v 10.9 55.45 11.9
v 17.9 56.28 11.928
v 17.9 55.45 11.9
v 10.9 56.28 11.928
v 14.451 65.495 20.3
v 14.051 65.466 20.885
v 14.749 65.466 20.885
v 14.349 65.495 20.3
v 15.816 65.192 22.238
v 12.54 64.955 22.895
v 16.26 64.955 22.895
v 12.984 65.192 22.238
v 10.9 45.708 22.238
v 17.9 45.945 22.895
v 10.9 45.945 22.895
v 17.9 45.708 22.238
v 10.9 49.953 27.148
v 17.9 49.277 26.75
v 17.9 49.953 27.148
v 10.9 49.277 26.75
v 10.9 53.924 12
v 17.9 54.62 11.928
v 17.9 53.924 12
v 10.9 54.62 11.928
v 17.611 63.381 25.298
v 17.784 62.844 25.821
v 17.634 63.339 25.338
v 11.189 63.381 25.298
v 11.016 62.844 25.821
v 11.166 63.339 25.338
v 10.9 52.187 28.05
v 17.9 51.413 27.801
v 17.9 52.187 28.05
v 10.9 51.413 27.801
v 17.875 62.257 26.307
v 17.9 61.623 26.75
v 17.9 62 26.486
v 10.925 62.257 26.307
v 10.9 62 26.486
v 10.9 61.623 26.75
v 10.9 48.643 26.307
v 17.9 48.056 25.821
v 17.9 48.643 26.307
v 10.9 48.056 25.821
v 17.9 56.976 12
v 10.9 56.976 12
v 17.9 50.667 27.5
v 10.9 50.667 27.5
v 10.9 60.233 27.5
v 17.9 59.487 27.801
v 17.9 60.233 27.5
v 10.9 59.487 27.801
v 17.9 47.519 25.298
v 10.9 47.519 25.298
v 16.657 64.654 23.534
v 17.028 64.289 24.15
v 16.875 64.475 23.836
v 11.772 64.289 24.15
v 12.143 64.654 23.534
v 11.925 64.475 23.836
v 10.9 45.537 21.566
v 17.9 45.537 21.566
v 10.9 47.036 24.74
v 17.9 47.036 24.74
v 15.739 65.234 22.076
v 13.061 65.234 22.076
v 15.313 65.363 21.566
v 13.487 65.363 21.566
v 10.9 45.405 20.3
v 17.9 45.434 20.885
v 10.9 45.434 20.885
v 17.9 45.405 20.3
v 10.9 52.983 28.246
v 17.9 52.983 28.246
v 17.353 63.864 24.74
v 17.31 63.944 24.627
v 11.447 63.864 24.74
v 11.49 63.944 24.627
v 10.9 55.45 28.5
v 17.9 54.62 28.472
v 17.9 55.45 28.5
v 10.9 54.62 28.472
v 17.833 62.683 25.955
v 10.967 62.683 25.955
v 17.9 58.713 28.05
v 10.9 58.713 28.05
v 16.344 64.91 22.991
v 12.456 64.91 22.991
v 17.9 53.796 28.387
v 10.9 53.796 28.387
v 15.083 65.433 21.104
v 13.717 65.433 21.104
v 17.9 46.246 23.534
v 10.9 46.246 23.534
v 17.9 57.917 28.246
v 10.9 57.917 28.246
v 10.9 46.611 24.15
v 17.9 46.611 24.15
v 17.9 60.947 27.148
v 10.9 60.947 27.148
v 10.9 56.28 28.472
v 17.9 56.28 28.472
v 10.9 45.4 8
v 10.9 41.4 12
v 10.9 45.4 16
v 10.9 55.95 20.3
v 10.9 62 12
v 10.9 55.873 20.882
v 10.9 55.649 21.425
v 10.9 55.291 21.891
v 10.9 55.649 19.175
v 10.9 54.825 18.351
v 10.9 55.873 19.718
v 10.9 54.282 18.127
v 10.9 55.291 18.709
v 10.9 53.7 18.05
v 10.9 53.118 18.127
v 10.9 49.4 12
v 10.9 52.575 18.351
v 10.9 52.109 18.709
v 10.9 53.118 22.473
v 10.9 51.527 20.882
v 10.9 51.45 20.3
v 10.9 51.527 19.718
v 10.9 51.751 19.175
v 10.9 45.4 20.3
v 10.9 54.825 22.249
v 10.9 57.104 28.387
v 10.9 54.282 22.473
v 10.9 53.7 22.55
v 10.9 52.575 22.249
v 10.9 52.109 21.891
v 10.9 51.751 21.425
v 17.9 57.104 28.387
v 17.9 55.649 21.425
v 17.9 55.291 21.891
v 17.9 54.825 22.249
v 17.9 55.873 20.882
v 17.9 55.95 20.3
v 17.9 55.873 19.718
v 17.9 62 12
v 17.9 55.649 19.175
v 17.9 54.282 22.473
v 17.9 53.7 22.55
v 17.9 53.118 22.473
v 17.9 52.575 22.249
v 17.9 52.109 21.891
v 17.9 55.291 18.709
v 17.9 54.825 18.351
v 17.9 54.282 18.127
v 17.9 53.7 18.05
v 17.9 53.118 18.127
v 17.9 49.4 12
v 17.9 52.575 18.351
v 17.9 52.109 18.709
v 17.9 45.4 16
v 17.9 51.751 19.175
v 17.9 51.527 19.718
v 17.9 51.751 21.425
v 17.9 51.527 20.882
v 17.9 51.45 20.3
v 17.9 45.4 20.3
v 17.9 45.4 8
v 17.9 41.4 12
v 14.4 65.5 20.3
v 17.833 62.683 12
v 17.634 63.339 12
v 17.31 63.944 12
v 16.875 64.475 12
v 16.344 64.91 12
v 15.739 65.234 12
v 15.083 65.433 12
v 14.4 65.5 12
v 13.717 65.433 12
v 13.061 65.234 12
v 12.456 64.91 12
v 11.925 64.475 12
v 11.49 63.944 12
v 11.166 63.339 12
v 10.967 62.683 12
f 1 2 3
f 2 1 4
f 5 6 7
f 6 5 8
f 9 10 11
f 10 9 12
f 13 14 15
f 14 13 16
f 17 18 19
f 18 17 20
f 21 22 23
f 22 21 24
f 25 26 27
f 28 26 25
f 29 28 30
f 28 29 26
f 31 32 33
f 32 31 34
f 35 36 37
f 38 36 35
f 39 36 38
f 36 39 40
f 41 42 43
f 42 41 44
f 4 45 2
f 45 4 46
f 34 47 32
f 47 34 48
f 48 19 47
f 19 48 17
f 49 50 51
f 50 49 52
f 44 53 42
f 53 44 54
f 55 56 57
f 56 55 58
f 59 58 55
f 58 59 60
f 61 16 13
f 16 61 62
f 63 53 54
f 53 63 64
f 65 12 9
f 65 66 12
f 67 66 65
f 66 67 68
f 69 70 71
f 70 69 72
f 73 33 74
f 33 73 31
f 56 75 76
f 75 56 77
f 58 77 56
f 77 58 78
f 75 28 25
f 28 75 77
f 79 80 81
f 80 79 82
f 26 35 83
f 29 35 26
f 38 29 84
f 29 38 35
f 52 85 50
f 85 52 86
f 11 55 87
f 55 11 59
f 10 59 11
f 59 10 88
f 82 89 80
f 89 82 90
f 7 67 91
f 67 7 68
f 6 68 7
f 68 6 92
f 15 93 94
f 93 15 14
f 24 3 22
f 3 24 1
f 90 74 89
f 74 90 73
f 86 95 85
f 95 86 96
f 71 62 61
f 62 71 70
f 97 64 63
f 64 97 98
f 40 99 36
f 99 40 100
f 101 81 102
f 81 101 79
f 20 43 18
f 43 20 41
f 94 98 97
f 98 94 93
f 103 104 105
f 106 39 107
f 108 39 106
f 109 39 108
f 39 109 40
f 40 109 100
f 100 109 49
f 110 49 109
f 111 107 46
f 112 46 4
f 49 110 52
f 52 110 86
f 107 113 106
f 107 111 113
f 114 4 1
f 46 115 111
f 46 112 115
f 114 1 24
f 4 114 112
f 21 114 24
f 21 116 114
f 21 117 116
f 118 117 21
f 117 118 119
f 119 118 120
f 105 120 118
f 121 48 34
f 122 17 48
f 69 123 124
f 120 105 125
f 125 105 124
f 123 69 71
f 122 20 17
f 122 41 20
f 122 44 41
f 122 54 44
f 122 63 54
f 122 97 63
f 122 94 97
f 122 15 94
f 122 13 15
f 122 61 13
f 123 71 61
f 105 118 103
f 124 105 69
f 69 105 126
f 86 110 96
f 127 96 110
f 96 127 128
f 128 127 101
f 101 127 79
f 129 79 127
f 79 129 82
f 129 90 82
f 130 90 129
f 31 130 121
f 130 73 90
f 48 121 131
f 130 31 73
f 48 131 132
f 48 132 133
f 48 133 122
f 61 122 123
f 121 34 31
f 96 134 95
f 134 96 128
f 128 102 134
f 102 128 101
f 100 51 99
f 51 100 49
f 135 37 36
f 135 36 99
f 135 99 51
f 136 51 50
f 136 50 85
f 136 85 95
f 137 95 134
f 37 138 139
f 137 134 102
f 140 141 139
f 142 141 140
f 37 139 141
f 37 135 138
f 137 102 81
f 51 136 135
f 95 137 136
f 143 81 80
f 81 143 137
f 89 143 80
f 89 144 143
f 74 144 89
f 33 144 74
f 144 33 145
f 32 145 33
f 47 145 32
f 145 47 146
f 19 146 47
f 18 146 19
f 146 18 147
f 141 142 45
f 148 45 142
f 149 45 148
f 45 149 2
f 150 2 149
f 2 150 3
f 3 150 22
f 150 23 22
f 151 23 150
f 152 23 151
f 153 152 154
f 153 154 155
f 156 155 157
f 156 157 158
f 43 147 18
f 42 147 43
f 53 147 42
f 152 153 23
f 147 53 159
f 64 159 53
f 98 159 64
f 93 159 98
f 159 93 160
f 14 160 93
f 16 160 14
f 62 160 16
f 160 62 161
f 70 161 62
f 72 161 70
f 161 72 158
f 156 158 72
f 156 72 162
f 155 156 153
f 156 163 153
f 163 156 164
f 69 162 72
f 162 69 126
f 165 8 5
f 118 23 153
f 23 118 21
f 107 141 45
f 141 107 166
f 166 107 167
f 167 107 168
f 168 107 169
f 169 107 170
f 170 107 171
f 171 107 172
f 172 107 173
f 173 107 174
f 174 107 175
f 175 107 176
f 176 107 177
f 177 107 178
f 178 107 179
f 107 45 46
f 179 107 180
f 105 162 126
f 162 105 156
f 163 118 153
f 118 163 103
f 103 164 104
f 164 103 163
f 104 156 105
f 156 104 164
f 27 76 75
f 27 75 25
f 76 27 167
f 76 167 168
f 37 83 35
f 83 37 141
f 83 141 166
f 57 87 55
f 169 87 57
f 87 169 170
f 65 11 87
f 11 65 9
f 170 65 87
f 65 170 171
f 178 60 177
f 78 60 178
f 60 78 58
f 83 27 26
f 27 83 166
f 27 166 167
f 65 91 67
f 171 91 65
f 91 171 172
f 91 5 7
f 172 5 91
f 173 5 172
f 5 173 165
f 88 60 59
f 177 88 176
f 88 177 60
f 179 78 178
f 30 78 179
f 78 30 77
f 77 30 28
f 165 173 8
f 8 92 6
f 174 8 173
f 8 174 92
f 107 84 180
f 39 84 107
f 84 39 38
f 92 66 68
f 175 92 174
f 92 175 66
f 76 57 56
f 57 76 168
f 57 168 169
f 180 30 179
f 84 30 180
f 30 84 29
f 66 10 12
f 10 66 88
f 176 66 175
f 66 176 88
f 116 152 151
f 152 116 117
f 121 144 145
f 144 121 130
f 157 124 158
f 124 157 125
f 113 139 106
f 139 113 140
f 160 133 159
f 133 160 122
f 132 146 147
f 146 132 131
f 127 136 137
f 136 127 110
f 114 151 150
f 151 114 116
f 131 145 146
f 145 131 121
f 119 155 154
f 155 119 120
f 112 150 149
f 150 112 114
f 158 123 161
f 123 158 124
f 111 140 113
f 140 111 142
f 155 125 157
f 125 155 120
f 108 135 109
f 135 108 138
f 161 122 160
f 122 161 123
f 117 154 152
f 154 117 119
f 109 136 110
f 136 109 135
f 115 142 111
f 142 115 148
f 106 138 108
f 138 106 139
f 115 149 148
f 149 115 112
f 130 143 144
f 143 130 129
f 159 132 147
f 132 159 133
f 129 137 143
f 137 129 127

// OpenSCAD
//Delta Emmett P/S Mounting Bracket
//Bracket for mounting P/S on 2 - 1/2" EMT, 2 - 3/4" EMT or 2 - 1/2" PVC Horizontals
//12/9/2015     By: David Bunch
//10/23/2016    Modified for use with an P/S holding bracket
//11/3/2016     Combined 1/2"EMT, 3/4"EMT & 1/2"PVC into 1 file & added extension for short build O.D.

Ht = 12;
ET = 2;                 //0 = 1/2", 1 = 3/4", 2 = 1/2" PVC
HoleID = 3.5;           //Probably need M3x16mm screws for Bracket mount to 3/4" EMT
                        //and M3x30mm screws for 1/2" EMT or 1/2" PVC
PS_Hole_OD = 4.5;       //Diameter of Hole for P/S
BoltHdDia = 7.8;        //Diameer of M3 Bolt Head
M3Nut = 7;              //Diameter of M3 Nut to use

Extend_PS_Hole = 1;     //1 = Extend Hole, 0 = Not
//
//Setup arrays to choose between 1/2"EMT, 3/4"EMT or 1/2"PVC based on ET variable
A_Pipe_Type = [12,34,12];
A_Pipe_OD = [18.4,23.7,21.8];
A_Hole_Y_Offset = [12.5,20,14.2];
A_PS_Hole_Y_Offset = [58.8,41.15,53.7];
A_M3Head_X_Offset = [9.7,5,10.48];
A_M3Nut_X_Offset = [-9.7,-4.97,-10.48];
A_Weld_Offset = [50.5,32.85,45.4];
A_PS_Ext_X_Offset = [9.2,11.9,10.9];
A_Z_Ext_Hole = [0,14.3];        //This array based on Extend_PS_Hole Index
A_CutEnd_Y_Offset = [67.1,49.45,62];
Ht2 = Ht / 2;

Pipe_Type = A_Pipe_Type[ET];
Pipe_OD = A_Pipe_OD[ET];
Hole_Y_Offset = A_Hole_Y_Offset[ET];
Pipe_Y_Offset = Hole_Y_Offset * 2;
PS_Hole_Y_Offset = A_PS_Hole_Y_Offset[ET];
M3Head_X_Offset = A_M3Head_X_Offset[ET];
M3Nut_X_Offset = A_M3Nut_X_Offset[ET];
Weld_Offset = A_Weld_Offset[ET];
PS_Ext_X_Offset = A_PS_Ext_X_Offset[ET];
//Ext_Y_Offset = A_Ext_Y_Offset[ET];
echo(PS_Ext_X_Offset = PS_Ext_X_Offset);
Z_Ext_Hole = A_Z_Ext_Hole[Extend_PS_Hole];
echo(Z_Ext_Hole = Z_Ext_Hole);
CutEnd_Y_Offset = A_CutEnd_Y_Offset[ET];

Hole_Res = 24;
Pipe_Res = (round(((Pipe_OD * 3.14)/4)/.7)*4);      //Resolution for Chamfer Pipe Cuts
echo(Pipe_Res = Pipe_Res);
$fn=76;
module PS_Bracket()
{
    if (ET < 2)
    {
        if (Extend_PS_Hole == 0)
        {
            linear_extrude(height = Ht, center = false, convexity = 10)
            import("Pipes_PS_Brackets.dxf", layer = str("EMT",Pipe_Type,"_PS_Bracket_Outline"));
        } else
        {
            union()
            {
                linear_extrude(height = Ht, center = false, convexity = 10)
                import("Pipes_PS_Brackets.dxf", layer = str("EMT",Pipe_Type,"_PS_Bracket_Outline"));
                ExtendConnect();
                translate([PS_Ext_X_Offset,Weld_Offset,Ht])
                rotate([0,90,0])
                cylinder(d=8,h=7,$fn=4);
            }
        }
    } else
    {
        if (Extend_PS_Hole == 0)
        {
            linear_extrude(height = Ht, center = false, convexity = 10)
            import("Pipes_PS_Brackets.dxf", layer = str("PVC",Pipe_Type,"_PS_Bracket_Outline"));
        } else
        {
            union()
            {
                linear_extrude(height = Ht, center = false, convexity = 10)
                import("Pipes_PS_Brackets.dxf", layer = str("PVC",Pipe_Type,"_PS_Bracket_Outline"));
                ExtendConnect();
                translate([PS_Ext_X_Offset,Weld_Offset,Ht])
                rotate([0,90,0])
                cylinder(d=8,h=7,$fn=4);
            }
        }        
    }
}
module PS_Bracket_Cut()
{
    if (ET < 2)
    {
    translate([0,0,-1])
        linear_extrude(height = Ht+ 2, center = false, convexity = 10)
        import("Pipes_PS_Brackets.dxf", layer = str("EMT",Pipe_Type,"_PS_Bracket_Cutout"));
    } else
    {
    translate([0,0,-1])
        linear_extrude(height = Ht + 2, center = false, convexity = 10)
        import("Pipes_PS_Brackets.dxf", layer = str("PVC",Pipe_Type,"_PS_Bracket_Cutout"));
    }
}
module CutNutTrap()
{
    rotate([0,90,0])
    rotate([90,0,0])
    {
        translate([0,0,-2.25])
        cylinder(d=7,h=4.5,$fn=6);
        translate([-20,-3.0311,-2.25])
        cube([20,6.0622,4.5]);
    }
}
module TaperPipe_Hole()
{
    translate([0,0,Ht-1])
    cylinder(d1 = Pipe_OD, d2 = Pipe_OD+2, h = 1.01, $fn = Pipe_Res);
    translate([0,-Pipe_Y_Offset,Ht-1])
    cylinder(d1=Pipe_OD,d2=Pipe_OD+2,h=1.01, $fn = Pipe_Res);

    translate([0,0,-.01])
    cylinder(d1 = Pipe_OD + 2, d2 = Pipe_OD, h = 1.01, $fn = Pipe_Res);
    translate([0,-Pipe_Y_Offset,-.01])
    cylinder(d1 = Pipe_OD + 2, d2 = Pipe_OD, h = 1.01, $fn = Pipe_Res);
}
module ExtendConnect()
{
    echo(PS_Hole_Y_Offset = PS_Hole_Y_Offset);
//    hull()
//    {
        translate([PS_Ext_X_Offset,PS_Hole_Y_Offset+1.75,Ht2+14.2])
        rotate([0,90,0])
        scale([1,20.1/16.6,1])
        cylinder(d=16.6,h=7,$fn=76);

        translate([PS_Ext_X_Offset,PS_Hole_Y_Offset - 8.3,Ht])
        cube([7,20.1,8.3]);

//        translate([9.2,PS_Hole_Y_Offset+1.75,8.3])
//        rotate([0,90,0])
//        scale([1,20.1/16.6,1])
//        cylinder(d=16.6,h=7,$fn=76);
//    }
}


module DrawBracket()
{
    difference()
    {
        PS_Bracket();
        PS_Bracket_Cut();
        translate([PS_Ext_X_Offset+3.5,CutEnd_Y_Offset,-1])
        difference()
        {
            cylinder(d=20,h=30,$fn=32);
            translate([0,0,-1])
            cylinder(d=7,h=32,$fn=32);
            translate([-15,-30,-1])
            cube([30,30,32]);
        }
        translate([-15,-Hole_Y_Offset,Ht2])
        rotate([0,90,0])
        cylinder(d=HoleID,h=30,$fn=Hole_Res);         //M3 hole to tighten Bracket around 1/2" EMT

        translate([M3Head_X_Offset,-Hole_Y_Offset,Ht2])
        rotate([0,90,0])
        cylinder(d=6,h=3,$fn=Hole_Res);               //Countersink M3 socket head by 2mm
        translate([M3Nut_X_Offset,-Hole_Y_Offset,Ht2])
        rotate([0,-90,0])
        cylinder(d=M3Nut,h=3,$fn=6);               //Countersink M3 Nut by 2mm
//        if (ET == 0)
//        {
            translate([8.2,PS_Hole_Y_Offset,Ht/2+Z_Ext_Hole])
            rotate([0,90,0])
            cylinder(d=PS_Hole_OD,h=30,$fn=Hole_Res);         //M4 hole for P/S
//        } else
//        {
//            translate([8.2,PS_Hole_Y_Offset,Ht/2])
//            rotate([0,90,0])
//            cylinder(d=PS_Hole_OD,h=30,$fn=Hole_Res);         //M4 hole for P/S
//        }
        TaperPipe_Hole();
//        translate([0,0,Ht2])
//        cylinder(d=300,h=100);                    //Cross Section Test
    }
}
DrawBracket();
